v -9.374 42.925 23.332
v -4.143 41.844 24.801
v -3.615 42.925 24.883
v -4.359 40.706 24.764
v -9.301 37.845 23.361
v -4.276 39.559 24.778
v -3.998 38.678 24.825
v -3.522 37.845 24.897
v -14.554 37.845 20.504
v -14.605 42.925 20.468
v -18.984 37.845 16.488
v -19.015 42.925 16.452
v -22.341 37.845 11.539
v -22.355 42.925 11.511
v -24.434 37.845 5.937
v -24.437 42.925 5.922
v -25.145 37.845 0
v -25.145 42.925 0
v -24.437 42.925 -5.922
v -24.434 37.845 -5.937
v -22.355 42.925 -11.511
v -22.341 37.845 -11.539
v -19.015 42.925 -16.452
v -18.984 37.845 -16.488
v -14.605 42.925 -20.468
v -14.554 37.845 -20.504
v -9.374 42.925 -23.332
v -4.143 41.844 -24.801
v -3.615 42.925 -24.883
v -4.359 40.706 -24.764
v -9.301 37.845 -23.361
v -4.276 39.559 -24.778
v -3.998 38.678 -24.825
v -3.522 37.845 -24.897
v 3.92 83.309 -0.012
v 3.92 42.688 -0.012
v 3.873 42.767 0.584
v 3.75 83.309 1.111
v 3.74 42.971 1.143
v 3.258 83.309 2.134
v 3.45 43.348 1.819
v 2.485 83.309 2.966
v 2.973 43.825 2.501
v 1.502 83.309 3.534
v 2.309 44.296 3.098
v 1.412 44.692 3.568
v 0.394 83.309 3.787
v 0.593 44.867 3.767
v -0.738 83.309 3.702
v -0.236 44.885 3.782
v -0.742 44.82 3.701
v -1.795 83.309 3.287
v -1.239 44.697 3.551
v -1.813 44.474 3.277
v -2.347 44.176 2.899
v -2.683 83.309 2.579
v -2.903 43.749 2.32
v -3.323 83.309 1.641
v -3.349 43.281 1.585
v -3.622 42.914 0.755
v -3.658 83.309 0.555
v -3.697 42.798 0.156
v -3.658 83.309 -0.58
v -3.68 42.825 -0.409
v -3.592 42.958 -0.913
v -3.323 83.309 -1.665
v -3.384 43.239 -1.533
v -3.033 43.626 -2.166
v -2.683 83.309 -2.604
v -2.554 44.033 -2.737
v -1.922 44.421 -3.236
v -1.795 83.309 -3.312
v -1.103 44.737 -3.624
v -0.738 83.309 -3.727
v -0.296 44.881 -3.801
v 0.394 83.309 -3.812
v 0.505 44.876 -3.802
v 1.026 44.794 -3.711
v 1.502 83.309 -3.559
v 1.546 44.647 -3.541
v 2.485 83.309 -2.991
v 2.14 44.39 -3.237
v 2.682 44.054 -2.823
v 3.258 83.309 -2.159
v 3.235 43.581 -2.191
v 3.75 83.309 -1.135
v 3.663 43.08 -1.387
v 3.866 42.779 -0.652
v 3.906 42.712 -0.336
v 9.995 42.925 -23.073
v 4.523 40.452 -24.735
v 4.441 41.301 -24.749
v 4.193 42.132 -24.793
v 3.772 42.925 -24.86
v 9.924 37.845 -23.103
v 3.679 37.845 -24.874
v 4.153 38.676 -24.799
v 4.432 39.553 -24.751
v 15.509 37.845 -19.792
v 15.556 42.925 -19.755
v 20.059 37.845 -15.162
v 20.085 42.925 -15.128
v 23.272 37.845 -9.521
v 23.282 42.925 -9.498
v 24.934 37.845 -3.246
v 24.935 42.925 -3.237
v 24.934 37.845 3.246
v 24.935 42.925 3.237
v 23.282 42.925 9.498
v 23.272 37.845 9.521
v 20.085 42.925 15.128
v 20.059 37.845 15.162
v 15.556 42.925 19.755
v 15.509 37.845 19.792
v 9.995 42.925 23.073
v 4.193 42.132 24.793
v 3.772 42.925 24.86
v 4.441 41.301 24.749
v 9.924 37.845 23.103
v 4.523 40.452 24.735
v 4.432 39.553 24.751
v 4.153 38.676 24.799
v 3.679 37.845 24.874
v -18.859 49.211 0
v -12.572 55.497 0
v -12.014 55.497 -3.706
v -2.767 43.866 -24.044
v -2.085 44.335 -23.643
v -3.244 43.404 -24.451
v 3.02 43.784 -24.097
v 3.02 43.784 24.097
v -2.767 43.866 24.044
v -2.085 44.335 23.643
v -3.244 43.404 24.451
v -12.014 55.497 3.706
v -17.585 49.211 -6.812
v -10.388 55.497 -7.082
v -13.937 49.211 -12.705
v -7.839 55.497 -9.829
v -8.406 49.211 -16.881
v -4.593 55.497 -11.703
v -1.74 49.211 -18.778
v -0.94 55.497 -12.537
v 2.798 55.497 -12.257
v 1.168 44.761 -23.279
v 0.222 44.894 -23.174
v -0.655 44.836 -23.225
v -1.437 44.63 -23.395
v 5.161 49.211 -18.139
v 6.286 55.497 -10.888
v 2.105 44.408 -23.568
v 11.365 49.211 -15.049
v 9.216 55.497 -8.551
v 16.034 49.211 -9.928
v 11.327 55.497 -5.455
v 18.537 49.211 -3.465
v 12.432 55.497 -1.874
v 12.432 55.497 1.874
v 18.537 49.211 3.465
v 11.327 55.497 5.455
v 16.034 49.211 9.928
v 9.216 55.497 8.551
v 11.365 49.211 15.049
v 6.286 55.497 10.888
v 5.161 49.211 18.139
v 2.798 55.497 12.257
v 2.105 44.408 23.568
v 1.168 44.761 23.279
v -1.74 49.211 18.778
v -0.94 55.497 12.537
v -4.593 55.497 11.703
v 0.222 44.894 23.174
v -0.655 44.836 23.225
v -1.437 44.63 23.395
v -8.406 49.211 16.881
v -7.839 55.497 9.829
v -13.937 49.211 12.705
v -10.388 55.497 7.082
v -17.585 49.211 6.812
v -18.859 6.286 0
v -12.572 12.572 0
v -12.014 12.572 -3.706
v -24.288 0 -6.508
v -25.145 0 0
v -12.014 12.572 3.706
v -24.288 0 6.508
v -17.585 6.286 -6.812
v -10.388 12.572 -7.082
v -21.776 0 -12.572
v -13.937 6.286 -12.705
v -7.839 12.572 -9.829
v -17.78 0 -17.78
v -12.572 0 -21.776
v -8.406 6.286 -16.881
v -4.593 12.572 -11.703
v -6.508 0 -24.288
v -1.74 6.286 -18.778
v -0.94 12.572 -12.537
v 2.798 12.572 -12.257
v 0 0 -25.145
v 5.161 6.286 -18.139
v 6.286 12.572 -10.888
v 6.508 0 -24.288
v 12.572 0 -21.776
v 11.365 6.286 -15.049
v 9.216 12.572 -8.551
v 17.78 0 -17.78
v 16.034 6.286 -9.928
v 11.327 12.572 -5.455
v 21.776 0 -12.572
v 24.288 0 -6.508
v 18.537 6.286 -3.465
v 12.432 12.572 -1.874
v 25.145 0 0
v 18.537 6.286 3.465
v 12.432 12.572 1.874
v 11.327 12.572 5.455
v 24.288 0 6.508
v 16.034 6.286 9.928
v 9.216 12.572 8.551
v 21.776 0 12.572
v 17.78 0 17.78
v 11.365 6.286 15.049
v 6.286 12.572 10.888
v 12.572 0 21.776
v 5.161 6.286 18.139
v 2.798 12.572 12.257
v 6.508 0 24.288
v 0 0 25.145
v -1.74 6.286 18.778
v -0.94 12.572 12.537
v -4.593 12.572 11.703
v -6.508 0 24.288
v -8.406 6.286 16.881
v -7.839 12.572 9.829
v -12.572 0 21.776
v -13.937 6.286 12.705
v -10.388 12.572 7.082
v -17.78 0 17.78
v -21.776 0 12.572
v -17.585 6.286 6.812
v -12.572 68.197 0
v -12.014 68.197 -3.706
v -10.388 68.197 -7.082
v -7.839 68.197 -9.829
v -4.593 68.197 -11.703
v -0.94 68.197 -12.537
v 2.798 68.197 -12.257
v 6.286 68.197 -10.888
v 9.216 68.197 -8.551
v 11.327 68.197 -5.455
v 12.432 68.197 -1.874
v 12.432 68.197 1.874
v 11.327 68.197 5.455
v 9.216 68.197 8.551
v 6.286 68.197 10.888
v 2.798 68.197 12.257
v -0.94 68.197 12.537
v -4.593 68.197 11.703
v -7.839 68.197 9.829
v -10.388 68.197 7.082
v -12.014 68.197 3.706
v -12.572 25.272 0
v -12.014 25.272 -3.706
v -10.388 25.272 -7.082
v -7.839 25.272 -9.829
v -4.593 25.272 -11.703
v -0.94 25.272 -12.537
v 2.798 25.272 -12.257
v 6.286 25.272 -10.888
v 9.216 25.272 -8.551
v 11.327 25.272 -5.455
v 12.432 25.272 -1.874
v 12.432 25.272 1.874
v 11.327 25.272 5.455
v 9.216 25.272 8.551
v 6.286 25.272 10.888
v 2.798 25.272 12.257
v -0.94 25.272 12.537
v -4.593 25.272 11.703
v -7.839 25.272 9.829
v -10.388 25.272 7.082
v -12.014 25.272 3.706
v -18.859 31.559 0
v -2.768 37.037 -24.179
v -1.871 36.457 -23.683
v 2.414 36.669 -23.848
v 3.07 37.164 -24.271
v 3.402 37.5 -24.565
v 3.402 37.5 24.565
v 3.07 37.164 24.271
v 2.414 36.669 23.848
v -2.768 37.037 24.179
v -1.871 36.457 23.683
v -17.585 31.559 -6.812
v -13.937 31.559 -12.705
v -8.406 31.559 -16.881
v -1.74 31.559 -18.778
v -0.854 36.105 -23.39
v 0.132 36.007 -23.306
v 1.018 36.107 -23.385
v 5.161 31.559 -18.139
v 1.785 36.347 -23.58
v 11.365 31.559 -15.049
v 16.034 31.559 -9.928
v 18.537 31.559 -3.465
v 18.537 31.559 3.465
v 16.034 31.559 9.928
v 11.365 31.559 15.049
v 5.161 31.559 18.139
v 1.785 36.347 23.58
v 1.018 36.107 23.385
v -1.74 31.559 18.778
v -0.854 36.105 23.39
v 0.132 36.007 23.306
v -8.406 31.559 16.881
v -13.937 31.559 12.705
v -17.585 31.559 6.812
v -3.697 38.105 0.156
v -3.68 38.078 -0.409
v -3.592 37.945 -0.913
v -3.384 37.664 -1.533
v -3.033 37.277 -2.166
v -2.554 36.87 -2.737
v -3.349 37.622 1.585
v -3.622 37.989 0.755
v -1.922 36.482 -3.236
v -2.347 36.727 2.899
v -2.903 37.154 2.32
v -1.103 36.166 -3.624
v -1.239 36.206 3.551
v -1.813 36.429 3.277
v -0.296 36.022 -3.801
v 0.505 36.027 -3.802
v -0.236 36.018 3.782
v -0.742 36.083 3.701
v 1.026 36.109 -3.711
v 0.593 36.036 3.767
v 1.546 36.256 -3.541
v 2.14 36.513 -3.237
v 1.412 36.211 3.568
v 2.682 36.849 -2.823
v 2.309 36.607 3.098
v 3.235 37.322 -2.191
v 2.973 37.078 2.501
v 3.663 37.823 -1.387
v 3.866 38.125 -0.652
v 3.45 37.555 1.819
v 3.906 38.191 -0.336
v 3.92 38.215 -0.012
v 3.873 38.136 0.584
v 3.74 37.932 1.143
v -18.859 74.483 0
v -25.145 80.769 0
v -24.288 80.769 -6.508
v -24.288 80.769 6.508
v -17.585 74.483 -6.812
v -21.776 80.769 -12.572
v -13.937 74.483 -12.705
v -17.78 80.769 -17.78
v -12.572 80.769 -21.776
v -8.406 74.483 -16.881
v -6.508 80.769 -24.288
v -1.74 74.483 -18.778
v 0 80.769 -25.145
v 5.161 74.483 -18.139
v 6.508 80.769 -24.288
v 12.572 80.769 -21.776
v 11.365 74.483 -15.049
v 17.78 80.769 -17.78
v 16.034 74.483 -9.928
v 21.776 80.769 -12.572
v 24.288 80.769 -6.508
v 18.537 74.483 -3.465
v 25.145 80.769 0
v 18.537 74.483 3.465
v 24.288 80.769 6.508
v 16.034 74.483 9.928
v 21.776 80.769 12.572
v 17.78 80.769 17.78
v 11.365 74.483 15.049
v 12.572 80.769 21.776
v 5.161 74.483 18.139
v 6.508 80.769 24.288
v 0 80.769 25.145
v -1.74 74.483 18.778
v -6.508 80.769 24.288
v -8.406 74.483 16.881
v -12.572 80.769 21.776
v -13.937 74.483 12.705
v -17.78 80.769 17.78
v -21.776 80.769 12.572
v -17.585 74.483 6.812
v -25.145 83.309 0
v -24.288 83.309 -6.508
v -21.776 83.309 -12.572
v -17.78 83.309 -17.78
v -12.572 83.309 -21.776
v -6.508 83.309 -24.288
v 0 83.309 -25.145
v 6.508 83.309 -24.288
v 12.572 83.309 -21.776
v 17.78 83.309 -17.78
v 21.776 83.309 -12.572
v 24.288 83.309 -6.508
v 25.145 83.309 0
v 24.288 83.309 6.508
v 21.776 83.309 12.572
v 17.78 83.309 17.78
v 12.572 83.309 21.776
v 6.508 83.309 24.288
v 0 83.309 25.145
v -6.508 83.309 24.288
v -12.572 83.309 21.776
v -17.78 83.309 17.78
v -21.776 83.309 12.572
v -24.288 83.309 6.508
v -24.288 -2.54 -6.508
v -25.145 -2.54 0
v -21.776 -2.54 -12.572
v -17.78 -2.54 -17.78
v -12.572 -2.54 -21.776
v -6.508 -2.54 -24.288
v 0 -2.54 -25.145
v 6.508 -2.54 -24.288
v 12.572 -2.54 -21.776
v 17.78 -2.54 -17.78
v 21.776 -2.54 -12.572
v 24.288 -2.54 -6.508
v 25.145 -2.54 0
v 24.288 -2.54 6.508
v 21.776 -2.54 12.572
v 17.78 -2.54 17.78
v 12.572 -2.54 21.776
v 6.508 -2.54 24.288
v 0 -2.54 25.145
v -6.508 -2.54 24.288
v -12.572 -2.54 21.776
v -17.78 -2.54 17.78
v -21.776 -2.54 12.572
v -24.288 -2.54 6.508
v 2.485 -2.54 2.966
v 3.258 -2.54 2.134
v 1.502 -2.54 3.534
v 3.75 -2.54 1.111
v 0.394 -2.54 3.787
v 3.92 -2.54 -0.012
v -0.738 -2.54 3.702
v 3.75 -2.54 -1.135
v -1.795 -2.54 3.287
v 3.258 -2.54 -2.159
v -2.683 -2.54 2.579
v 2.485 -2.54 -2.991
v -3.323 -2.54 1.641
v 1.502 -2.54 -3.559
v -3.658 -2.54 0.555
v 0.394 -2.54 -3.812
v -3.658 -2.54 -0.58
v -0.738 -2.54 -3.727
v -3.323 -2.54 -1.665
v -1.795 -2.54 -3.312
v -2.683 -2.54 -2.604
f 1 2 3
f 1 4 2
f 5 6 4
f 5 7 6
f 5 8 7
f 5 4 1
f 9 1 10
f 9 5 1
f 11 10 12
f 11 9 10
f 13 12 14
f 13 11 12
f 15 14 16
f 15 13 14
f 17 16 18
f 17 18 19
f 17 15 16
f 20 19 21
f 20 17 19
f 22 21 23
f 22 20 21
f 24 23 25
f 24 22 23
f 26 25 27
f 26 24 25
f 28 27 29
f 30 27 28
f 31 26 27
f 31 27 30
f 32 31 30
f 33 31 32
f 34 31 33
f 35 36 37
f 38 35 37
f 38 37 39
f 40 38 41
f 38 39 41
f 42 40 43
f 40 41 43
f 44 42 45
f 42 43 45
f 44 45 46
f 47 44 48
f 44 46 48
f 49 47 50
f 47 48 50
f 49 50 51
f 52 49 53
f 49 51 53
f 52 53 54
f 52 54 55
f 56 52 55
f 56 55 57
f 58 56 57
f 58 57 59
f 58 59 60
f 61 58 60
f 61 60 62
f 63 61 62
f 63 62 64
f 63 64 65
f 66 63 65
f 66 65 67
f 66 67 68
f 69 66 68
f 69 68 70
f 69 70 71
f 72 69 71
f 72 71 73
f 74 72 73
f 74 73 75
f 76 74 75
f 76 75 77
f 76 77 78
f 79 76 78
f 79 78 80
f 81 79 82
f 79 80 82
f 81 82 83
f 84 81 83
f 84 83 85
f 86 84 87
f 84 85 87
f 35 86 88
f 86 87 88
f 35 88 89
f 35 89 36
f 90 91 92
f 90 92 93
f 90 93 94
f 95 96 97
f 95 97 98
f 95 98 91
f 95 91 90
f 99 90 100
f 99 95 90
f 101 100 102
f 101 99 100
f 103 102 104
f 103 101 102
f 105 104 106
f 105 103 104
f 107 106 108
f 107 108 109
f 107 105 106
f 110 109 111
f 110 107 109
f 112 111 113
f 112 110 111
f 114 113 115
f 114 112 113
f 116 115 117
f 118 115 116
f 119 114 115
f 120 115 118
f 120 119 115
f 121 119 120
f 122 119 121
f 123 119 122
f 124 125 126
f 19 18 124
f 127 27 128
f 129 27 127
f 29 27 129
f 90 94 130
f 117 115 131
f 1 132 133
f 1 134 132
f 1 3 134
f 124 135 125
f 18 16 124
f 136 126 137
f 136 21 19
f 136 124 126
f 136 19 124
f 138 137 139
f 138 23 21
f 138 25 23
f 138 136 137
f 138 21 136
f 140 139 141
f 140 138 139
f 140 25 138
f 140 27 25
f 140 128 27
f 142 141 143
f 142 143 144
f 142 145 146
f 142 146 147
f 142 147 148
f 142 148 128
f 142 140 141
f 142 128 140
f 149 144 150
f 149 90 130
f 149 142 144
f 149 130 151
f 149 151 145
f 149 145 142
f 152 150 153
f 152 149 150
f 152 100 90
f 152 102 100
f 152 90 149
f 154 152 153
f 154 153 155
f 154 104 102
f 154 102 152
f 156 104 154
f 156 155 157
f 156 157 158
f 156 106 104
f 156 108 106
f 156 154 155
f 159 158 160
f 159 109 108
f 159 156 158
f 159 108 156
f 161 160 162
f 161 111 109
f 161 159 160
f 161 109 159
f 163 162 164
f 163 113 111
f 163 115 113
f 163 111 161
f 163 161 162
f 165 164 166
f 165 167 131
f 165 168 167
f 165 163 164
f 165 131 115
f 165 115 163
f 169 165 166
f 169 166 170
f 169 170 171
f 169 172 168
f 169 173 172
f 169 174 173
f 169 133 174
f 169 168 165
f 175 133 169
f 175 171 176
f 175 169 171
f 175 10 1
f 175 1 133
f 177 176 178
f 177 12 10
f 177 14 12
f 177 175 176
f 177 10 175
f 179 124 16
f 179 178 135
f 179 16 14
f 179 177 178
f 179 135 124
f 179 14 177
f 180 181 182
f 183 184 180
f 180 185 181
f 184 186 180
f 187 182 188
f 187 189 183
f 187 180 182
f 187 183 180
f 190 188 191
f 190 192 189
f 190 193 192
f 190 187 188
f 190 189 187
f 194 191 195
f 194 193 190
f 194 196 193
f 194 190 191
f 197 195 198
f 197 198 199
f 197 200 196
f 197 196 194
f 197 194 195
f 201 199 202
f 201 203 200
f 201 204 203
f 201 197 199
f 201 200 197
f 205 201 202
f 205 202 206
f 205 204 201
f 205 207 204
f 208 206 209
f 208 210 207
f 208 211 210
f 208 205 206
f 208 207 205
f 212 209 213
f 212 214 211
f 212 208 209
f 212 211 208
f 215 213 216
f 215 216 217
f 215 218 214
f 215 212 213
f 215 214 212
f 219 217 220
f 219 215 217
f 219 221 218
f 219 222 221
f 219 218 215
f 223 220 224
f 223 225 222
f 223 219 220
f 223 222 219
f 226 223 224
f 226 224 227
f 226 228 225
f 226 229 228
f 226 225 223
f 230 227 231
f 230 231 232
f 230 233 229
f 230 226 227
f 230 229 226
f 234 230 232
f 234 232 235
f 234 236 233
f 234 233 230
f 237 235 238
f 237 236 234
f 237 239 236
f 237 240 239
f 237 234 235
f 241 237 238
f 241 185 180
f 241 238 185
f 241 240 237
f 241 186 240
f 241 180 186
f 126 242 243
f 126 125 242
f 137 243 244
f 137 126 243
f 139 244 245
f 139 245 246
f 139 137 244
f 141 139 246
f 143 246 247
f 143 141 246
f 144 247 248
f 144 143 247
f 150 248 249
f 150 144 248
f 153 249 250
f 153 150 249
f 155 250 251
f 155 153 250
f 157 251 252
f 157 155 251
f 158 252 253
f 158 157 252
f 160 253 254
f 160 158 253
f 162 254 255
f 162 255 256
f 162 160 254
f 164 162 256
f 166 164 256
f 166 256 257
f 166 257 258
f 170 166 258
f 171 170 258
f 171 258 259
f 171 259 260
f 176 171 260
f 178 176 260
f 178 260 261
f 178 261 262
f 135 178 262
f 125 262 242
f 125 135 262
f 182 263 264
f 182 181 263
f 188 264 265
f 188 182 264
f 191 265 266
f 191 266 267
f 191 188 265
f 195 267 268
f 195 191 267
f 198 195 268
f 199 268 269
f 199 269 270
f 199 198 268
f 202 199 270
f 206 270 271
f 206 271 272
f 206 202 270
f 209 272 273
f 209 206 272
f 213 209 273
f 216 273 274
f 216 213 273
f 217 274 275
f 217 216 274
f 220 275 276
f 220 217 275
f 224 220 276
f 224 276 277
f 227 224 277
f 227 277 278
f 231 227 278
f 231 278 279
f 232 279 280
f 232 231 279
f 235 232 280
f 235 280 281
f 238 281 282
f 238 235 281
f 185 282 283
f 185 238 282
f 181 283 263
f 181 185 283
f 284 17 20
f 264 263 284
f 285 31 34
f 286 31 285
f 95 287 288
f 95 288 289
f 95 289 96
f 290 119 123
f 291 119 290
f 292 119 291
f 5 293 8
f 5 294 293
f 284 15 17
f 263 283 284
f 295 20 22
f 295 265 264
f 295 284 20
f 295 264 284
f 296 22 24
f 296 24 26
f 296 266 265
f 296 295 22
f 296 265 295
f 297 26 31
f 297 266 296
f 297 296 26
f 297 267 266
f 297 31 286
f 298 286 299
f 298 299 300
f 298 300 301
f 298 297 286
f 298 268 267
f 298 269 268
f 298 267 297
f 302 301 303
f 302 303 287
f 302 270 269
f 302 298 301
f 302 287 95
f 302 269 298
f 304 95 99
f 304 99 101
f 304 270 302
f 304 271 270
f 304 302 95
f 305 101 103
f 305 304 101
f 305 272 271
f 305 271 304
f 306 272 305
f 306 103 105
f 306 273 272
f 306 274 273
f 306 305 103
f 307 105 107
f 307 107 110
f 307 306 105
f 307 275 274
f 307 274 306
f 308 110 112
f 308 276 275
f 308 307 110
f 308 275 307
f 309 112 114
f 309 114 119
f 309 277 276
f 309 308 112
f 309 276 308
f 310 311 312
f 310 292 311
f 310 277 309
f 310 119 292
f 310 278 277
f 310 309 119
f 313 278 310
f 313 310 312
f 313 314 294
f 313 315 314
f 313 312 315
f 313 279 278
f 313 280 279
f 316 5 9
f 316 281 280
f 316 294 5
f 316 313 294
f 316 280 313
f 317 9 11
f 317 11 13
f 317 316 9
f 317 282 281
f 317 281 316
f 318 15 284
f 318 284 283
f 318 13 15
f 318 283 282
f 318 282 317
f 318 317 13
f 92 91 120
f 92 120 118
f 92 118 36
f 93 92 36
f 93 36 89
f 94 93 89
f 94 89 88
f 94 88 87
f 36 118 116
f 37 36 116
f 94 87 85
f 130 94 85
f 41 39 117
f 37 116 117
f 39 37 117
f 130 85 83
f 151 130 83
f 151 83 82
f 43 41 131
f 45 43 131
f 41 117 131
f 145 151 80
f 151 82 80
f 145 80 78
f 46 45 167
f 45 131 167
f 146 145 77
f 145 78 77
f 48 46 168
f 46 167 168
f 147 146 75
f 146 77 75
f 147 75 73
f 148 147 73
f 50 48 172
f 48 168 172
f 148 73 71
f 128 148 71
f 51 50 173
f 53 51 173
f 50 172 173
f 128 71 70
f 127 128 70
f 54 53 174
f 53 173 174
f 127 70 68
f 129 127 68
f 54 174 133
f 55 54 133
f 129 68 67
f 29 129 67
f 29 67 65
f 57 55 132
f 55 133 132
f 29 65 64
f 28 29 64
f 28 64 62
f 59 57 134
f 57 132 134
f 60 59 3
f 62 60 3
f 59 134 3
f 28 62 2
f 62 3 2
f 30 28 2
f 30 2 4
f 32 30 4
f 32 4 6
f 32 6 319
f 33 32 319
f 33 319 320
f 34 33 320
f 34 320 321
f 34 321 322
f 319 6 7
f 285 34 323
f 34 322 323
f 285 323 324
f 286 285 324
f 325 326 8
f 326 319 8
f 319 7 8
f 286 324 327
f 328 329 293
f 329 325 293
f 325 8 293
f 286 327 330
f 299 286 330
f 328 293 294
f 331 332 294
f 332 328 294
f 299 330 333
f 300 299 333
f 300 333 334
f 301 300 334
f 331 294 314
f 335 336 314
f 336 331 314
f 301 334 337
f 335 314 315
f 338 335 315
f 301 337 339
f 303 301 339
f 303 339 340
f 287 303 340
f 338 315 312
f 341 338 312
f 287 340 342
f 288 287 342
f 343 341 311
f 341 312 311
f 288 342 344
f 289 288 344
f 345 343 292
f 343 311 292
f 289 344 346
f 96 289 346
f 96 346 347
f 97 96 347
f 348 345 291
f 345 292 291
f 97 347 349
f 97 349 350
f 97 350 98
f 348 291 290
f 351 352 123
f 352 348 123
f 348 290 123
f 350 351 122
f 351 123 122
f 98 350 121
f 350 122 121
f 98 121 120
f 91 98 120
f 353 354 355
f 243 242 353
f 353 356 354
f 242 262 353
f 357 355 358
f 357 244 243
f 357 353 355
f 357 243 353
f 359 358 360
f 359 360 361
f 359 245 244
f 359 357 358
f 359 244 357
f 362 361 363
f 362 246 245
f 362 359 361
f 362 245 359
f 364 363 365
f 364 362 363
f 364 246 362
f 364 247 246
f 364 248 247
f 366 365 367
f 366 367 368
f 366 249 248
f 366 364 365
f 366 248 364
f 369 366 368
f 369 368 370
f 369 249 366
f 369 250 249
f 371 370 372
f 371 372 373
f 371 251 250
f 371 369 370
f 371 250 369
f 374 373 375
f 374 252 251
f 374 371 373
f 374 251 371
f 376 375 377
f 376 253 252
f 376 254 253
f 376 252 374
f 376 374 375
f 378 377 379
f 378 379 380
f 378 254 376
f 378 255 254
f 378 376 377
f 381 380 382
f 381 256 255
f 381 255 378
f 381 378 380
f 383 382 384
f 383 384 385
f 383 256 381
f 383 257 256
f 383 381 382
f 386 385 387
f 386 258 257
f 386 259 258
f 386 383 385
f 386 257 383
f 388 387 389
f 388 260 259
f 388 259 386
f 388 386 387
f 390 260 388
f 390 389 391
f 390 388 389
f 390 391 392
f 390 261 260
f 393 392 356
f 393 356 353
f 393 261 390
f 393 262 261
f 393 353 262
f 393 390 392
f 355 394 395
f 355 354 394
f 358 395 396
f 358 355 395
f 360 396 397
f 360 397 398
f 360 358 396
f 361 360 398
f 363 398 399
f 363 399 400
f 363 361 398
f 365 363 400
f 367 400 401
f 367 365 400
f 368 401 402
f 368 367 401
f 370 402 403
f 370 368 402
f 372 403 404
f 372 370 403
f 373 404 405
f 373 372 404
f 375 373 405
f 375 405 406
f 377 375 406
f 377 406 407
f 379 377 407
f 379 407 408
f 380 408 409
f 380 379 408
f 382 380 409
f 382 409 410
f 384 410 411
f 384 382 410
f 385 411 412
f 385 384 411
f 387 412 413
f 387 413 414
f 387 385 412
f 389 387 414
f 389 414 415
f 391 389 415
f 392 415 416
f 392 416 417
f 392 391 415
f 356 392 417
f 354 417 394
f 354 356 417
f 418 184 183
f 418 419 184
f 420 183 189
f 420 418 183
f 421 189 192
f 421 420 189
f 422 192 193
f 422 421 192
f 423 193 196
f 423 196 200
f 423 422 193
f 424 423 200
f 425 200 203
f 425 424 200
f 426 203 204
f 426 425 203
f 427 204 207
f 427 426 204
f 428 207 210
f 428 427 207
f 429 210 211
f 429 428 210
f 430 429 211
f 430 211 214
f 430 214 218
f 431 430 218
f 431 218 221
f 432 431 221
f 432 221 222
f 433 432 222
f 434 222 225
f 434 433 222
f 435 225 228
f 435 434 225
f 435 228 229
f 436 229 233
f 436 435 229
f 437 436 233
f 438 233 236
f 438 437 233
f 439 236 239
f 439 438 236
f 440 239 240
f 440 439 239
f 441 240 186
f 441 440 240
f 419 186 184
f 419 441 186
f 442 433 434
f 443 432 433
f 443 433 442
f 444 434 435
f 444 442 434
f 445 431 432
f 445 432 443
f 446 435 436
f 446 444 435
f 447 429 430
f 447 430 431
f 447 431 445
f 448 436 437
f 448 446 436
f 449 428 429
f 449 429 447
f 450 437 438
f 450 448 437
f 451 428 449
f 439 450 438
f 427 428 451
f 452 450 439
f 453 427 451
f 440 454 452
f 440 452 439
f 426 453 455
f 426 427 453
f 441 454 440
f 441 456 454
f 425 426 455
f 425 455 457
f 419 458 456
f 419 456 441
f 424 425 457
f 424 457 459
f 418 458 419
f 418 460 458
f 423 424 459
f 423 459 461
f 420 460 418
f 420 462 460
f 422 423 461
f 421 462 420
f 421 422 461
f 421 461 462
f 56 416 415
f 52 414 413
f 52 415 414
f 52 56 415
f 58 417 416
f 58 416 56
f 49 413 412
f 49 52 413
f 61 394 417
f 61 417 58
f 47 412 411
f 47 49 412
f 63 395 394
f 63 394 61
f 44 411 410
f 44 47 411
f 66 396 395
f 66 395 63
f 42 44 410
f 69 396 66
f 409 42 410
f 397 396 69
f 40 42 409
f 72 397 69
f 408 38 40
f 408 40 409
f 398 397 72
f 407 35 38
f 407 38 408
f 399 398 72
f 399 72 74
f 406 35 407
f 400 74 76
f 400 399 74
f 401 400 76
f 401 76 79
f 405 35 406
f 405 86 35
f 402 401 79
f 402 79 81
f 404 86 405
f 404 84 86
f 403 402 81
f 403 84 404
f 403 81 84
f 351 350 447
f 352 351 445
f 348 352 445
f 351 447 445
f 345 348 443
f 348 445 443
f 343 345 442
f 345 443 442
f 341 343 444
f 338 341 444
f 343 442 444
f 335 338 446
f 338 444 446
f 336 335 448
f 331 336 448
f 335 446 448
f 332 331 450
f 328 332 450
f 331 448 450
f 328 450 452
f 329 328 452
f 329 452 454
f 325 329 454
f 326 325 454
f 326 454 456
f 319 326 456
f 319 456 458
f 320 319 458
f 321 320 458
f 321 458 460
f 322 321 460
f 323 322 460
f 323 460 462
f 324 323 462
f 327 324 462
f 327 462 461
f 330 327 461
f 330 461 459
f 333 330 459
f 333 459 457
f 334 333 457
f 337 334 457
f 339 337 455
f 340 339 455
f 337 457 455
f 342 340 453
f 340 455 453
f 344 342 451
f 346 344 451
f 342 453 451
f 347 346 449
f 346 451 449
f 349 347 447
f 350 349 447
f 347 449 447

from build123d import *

# Parameters (mm, degrees)
F3_R     = 4.445
F4_DEPTH = 177.545717
F6_R     = 3.81
F7_DEPTH = 235.710434


with BuildPart() as f1:
    # F0 (on Top) → F1 (revolve)
    with BuildSketch(Plane.XY):
        Polygon((-12.572359, 12.572359), (-25.144717, 0), (-25.144717, -2.54), (0, -2.54), (0, 0), (0, 80.769434), (0, 83.309434), (-25.144717, 83.309434), (-25.144717, 80.769434), (-12.572359, 68.197076), (-12.572359, 55.497076), (-25.144717, 42.924717), (-25.144717, 40.384717), (-25.144717, 37.844717), (-12.572359, 25.272359), align=None)
    revolve(axis=Axis((0, 40.384717, 0), (0, -1, 0)))

    # F3 (on offset) → F4 (cut, through all)
    with BuildSketch(Plane.XY.offset(152.4)):
        with Locations((0.078337, 40.451534)):
            Circle(F3_R)
    extrude(amount=-F4_DEPTH, mode=Mode.SUBTRACT)

    # F6 (on offset) → F7 (cut, through all)
    with BuildSketch(Plane.XZ.offset(152.4)):
        with Locations((0.109616, -0.012402)):
            Circle(F6_R)
    extrude(amount=-F7_DEPTH, mode=Mode.SUBTRACT)


solid = f1.part
